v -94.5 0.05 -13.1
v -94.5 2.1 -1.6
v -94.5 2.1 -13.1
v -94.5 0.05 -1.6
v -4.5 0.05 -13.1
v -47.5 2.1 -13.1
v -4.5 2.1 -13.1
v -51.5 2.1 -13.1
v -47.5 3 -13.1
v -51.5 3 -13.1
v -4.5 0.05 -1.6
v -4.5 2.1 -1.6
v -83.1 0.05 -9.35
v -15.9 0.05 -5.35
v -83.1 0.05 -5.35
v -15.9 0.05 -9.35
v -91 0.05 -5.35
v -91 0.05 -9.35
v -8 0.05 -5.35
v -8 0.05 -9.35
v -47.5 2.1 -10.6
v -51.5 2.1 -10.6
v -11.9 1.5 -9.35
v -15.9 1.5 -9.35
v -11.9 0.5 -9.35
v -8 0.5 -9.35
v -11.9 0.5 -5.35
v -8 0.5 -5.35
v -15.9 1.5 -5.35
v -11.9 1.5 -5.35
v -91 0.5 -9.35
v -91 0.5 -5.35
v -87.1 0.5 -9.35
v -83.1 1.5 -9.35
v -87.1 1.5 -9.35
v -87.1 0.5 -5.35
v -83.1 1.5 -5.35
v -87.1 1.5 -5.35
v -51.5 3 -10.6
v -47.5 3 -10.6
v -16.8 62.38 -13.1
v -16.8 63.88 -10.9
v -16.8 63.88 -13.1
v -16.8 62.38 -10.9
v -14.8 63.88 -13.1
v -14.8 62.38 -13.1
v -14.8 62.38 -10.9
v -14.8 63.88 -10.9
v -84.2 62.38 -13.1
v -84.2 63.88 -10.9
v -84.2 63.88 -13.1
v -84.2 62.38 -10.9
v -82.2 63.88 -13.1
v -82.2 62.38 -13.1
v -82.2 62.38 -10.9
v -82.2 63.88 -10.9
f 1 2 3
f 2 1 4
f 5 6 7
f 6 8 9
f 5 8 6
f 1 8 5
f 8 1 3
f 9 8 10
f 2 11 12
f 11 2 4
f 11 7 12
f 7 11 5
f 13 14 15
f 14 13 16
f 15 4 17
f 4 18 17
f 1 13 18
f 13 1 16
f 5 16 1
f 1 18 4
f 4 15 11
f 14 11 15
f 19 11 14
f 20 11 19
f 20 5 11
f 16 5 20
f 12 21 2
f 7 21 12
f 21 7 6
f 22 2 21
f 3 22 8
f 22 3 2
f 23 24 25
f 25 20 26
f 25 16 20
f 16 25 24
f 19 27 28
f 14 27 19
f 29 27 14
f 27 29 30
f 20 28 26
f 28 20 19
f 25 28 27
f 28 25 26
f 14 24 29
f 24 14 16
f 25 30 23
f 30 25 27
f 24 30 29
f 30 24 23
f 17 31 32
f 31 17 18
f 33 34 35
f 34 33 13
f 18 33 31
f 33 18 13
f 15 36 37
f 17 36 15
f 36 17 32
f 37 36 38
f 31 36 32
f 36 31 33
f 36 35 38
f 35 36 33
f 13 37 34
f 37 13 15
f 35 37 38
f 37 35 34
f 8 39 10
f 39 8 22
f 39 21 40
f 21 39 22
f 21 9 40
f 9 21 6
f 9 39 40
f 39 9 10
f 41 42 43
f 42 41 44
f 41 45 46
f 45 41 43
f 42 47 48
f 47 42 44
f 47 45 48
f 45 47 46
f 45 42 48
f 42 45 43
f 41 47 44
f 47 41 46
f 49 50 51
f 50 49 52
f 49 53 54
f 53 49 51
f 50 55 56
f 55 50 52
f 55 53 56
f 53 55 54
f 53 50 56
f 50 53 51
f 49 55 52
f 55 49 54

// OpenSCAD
////// MixTape 3d Printed Case///////////////////////////

// thanks for adding the wall thickness, Philip!

// 

plugHeight = 10.8; // [6:11]
tapeHeight = 11.5; //
topThickness = 1.6; 
screwHoleSize = 1;

bottom_wall_thickness = 2;

usb_charger = false;
cutout_aux_ports = true;
volume_wheel = true;
screws_port = false;

//rotate([55,0,$t*380]) translate([-50,0,0]){
rotate([0,180,0]) translate([0,0,0]){
//PCB();
//parts();

    union(){
        
                // that "click!"
        translate([49.5-(4/2),2,topThickness+tapeHeight-2.5]) cube([4,1,2.5],false);
        translate([14.8,62.38,topThickness+tapeHeight-2.2]) cube([2,1.5,2.2],false);
        translate([82.2,62.38,topThickness+tapeHeight-2.2]) cube([2,1.5,2.2],false);

difference(){
    
    union(){
        //tapeBody_screws();
        //tapeTop_screws();
        tapeBody();
        tapeTop();
        //FullCase();
        

    }
    
    // Plugs 
    translate([2.5,50,tapeHeight-plugHeight+topThickness]) cube([13,20,plugHeight+1],false); 
    translate([83.5,50,tapeHeight-plugHeight+topThickness]) cube([13,20,plugHeight+1],false);
    
    // write protectors 
    translate([10,0,0.5*tapeHeight+1.6]) cube([4,1,4],true);
    translate([13.9,0,0.5*tapeHeight+1.6]) cube([4,3,4],true);
    translate([89,0,0.5*tapeHeight+1.6]) cube([4,1,4],true);
    translate([85.1,0,0.5*tapeHeight+1.6]) cube([4,3,4],true);
    

    
    
    // Power signs
    //if (!usb_charger) {
    //    translate([41,0,0.5*tapeHeight+1.6]) cube([4,1.5,1],true);
    //    translate([41,0,0.5*tapeHeight+1.6]) cube([1,1.5,4],true);
    
    //    translate([58,0,0.5*tapeHeight+1.6]) cube([4,1.5,1],true); 
    //}
}
}
}

module tapeBody_screws(){
    
    difference(){
        tapeBody();
        //screwHolebtop();
        //screwHolebottom();
        //speakerHole();
    }
}   
module tapeTop_screws(){
    difference(){
        tapeTop();
        //screwHolebtopcover();
        //screwHolebtop();
        //screwHolebottom();
    }    
}   


// Modules ///////////////////////////////

module speakerHole(){   
    translate([0,18,tapeHeight/2 + topThickness])    
    for(z=[-180:45:+180])
      for(x=[4:3:12])
        rotate([90,z,90]) translate([x*0.45,0,0]) cylinder(h=10, r=0.4, $fn=30);
}


module PCB(){
color("DarkKhaki") 
translate ([0,0,tapeHeight+1.6]) linear_extrude(height = 1.6, center = false, convexity = 10, twist = 0) import("mixtape_case_3D_bottom.dxf", convexity=3);
color("Gold") 
translate ([0,0,tapeHeight+3.2]) linear_extrude(height = 0.2, center = false, convexity = 10, twist = 0) import("mixtape_case_3D_PCB.dxf", convexity=3);

color("DarkKhaki") 
translate ([0,0,tapeHeight+2*topThickness]) linear_extrude(height = 1.6, center = false, convexity = 10, twist = 0) import("mixtape_case_3D_PCB_TrapezBoard.dxf", convexity=3);
color("Gold") 
translate ([0,0,tapeHeight+3*topThickness]) linear_extrude(height = 0.2, center = false, convexity = 10, twist = 0) import("mixtape_case_3D_PCB_TrapezCircuit.dxf", convexity=3);
}

module tapeBody(){ 
    difference(){
        union(){
            difference(){ 
                //color("Deeppink") 
                translate ([0,0,1.6]) linear_extrude(height = tapeHeight, center = false, convexity = 10, twist = 0) import("mixtape_case_3D_bottom.dxf", convexity=3);  

                //if (!usb_charger) {
                    //translate ([0,0,0.6]) linear_extrude(height = tapeHeight+4, center = false, convexity = 10, twist = 0) import("mixtape_case_3D_MainCase.dxf", convexity=3);
                //} else {
                    //translate ([0,0,0.6]) linear_extrude(height = tapeHeight+4, center = false, convexity = 10, twist = 0) import("mixtape_case_3D_MainCase_USB.dxf", convexity=3);
                //}
                // cut out for SMD parts below
            #translate([89,48,1*tapeHeight+topThickness+3]) cube([15,6,tapeHeight],true);
                
                //Face holes
                translate([25,64,0.5*tapeHeight+topThickness]) cube([12,2,0.7*tapeHeight],true);
                if (!usb_charger) { 
                    translate([49.5,64,0.5*tapeHeight+topThickness]) cube([16,2,0.7*tapeHeight],true); 
                }
                translate([74.3,64,0.5*tapeHeight+topThickness]) cube([12,2,0.7*tapeHeight],true);

                translate([36,65,0.5*tapeHeight+topThickness]) cube([4,2,0.7*tapeHeight],true);
                translate([63,65,0.5*tapeHeight+topThickness]) cube([4,2,0.7*tapeHeight],true);

                if (usb_charger) {
                    // cutout usb port
                    translate([49.5,64,0.5*tapeHeight+topThickness+3])cube([20,14,0.7*tapeHeight+4],true);
                }

                // Side Aux Ports
                if (cutout_aux_ports) {
                   translate([1.5,22,0.8*tapeHeight+topThickness+4.8]) cube([20,12,tapeHeight],true);
                   translate([90,22,0.8*tapeHeight+topThickness+4.8]) cube([20,12,tapeHeight],true);      
                }
                
                // Volume Wheel
                if (volume_wheel) {
                    translate([90,40,0.8*tapeHeight+topThickness+4]) cube([20,17,tapeHeight],true);      
                }
            }
            translate([49.5,7.05,0.5*tapeHeight+topThickness]) cube([90,14,1*tapeHeight],true);
            
        } //end union
        
        
    // wall thickness
        translate([49.5,24+bottom_wall_thickness,0.5*tapeHeight+topThickness-1]) cube([93.2,42,1*tapeHeight+7],true);
        
    translate([49.5,1.8+bottom_wall_thickness,0.5*tapeHeight+topThickness-1]) cube([90,3.4,1*tapeHeight+7],true);
    
    translate([5.1, 4.3 + 0, tapeHeight+topThickness-(tapeHeight)-1   ]) cylinder(h=tapeHeight*1.5, r=2.2, center=false, ,$fn=30);
    translate([94, 4.3 + 0, tapeHeight+topThickness-(tapeHeight)-1   ]) cylinder(h=tapeHeight*1.5, r=2.2, center=false, ,$fn=30);  
        
        translate([49.5,40+bottom_wall_thickness+2.8,0.5*tapeHeight+topThickness-1]) cube([65,35,0.7*tapeHeight+7],true);
    } // end difference
    
    
    
    //color("DarkKhaki") 
    if (!usb_charger) {
    //translate([40,0.05,1.6]) cube([20,10,2.5],false);
    }
    
    //screw left
    if (screws_port){
  translate([4 - 0 , 46.640 + 0, tapeHeight+topThickness-(tapeHeight)   ]) cylinder(h=tapeHeight*1, r=2.8, center=false, ,$fn=30);   
  translate([95 - 0 , 46.640 + 0, tapeHeight+topThickness-(tapeHeight)   ]) cylinder(h=tapeHeight*1, r=2.8, center=false, ,$fn=30); 
  translate([4 - 0 , 2.80 + 0, tapeHeight+topThickness-(tapeHeight)   ]) cylinder(h=tapeHeight*1, r=2.5, center=false, ,$fn=30);   
  translate([95 - 0 , 2.80 + 0, tapeHeight+topThickness-(tapeHeight)   ]) cylinder(h=tapeHeight*1, r=2.5, center=false, ,$fn=30); 
    }
}


module screwHolebottom(){
  translate([4 - 0 , 3 + 0, 0  ]) cylinder(h=tapeHeight*4.1, r=screwHoleSize, center=true, ,$fn=30);
  translate([95 - 0 , 3 + 0, 0  ]) cylinder(h=tapeHeight*4.1, r=screwHoleSize, center=true, ,$fn=30);
}

module screwHolebtop(){
  //screw left
  translate([4.586 - 0 , 46.640 + 0, 0  ]) cylinder(h=11*4.1, r=screwHoleSize, center=true, ,$fn=30);
  //screw right
  translate([94.998 - 0 , 46.640 + 0, 0  ]) cylinder(h=11*4.1, r=screwHoleSize, center=true, ,$fn=30);
}


module screwHolebtopcover(){   
  //screw top left
  translate([4.586 - 0 , 46.640 + 0, 0+0-(0) - 0.0  ]) cylinder(h=topThickness*0.5, r=1.8, center=true, ,$fn=30);
  //screw top right
  translate([94.998 - 0 , 46.640 + 0, 0 - 0.0  ]) cylinder(h=topThickness*0.5, r=1.8, center=true, ,$fn=30); 

  //screw lower left
  translate([4 - 0 , 3 + 0, 0+0-(0) - 0.0  ]) cylinder(h=topThickness*0.5, r=1.8, center=true, ,$fn=30);
  //screw lower right
  translate([95 - 0 , 3 + 0, 0 - 0.0  ]) cylinder(h=topThickness*0.5, r=1.8, center=true, ,$fn=30);     
    
}


module tapeTop(){ 
 
difference(){ 
 color("Deeppink") 
     translate ([0,0,-1.5]) linear_extrude(height = 1.5, center = false, convexity = 10, twist = 0) import("mixtape_case_3D_TopTrapez.dxf", convexity=3);
     
   color("Gold") 
     translate ([0,0,-2.2]) linear_extrude(height = 3, center = false, convexity = 10, twist = 0) import("mixtape_case_3D_Holes.dxf", convexity=3);
   translate([50,53,-2.2]) cylinder(h=1.2, r=1.3, center=false, ,$fn=30);
}   
    

difference(){    
  color("Deeppink") 
     translate ([0,0,0]) linear_extrude(height = 1.6, center = false, convexity = 10, twist = 0) import("mixtape_case_3D_bottom.dxf", convexity=3);

  translate([4,3,-1]) cylinder(h=1.5, r=1.3, center=false, ,$fn=30);
  translate([95,3,-1]) cylinder(h=1.5, r=1.3, center=false, ,$fn=30);
  translate([4,61,-1]) cylinder(h=1.5, r=1.3, center=false, ,$fn=30);
  translate([95,61,-1]) cylinder(h=1.5, r=1.3, center=false, ,$fn=30);
    
  color("Pink") 
     translate ([0,0,-1.3]) linear_extrude(height = 2, center = false, convexity = 10, twist = 0) import("mixtape_case_3D_WindowRect.dxf", convexity=3); 
    
  difference(){    
  color("Gold") 
     translate ([0,0,-0.5]) linear_extrude(height = 1, center = false, convexity = 10, twist = 0) import("mixtape_case_3D_BigRect.dxf", convexity=3);  
  

  translate ([0,0,-3]) linear_extrude(height = 10, center = false, convexity = 10, twist = 0) import("mixtape_case_3D_MidRect.dxf", convexity=3);   
  }
  
  translate ([0,0,-3]) linear_extrude(height = 5.5, center = false, convexity = 10, twist = 0) import("mixtape_case_3D_Wheels.dxf", convexity=3); 
}

  translate ([0,0,0.4]) linear_extrude(height = 1.2, center = false, convexity = 10, twist = 0) import("mixtape_case_3D_NutWheels.dxf", convexity=3); 

}
 

module parts(){
    // IC-Socket
  color("Grey")
      translate([44,22.5,tapeHeight+2*topThickness]) cube([11,13,4],false);
    
  difference(){
  color("Black")
      translate([45,23.5,tapeHeight+2*topThickness]) cube([9,11,7],false);
        
    translate([49.5,34.5,tapeHeight+2*topThickness+6]) cylinder(h=10, r=1.5, center=false, ,$fn=30);
    }
    
    // NEO-Pixels
    for (a = [ 0 : 6.3 : 46 ])
    translate([a,0,0]) NEOpixel();
    
    module NEOpixel(){
    color("White")
      translate([25.2,52.5,tapeHeight+3*topThickness]) cube([5,5,2],false);
        
    color("Deeppink")
      translate([27.7,55,tapeHeight+3*topThickness]) cylinder(h=2.5, r=2, center=false, ,$fn=30);
    }
    
    // Pots
    potentiometer();
    translate ([42,0,0]) potentiometer();
    
    module potentiometer(){
    color("Grey")
      translate([29,29,tapeHeight+2*topThickness]) cylinder(h=10, r=3.5, center=false, ,$fn=30);
    
    color("Deeppink")
        translate([29,29,tapeHeight+2*topThickness+2]) cylinder(h=12, r1=6, r2=4.5, center=false, ,$fn=30);
    }
    
    // Buttons
    button();
    translate ([58,0,0]) button();
    
    module button(){
    color("Grey")
      translate([17.5,9.8,tapeHeight+2*topThickness]) cube([6,6,3],false);
        
    color("Red")
      translate([20.5,12.8,tapeHeight+2*topThickness]) cylinder(h=5, r=1.5, center=false, ,$fn=30);
    }

}
